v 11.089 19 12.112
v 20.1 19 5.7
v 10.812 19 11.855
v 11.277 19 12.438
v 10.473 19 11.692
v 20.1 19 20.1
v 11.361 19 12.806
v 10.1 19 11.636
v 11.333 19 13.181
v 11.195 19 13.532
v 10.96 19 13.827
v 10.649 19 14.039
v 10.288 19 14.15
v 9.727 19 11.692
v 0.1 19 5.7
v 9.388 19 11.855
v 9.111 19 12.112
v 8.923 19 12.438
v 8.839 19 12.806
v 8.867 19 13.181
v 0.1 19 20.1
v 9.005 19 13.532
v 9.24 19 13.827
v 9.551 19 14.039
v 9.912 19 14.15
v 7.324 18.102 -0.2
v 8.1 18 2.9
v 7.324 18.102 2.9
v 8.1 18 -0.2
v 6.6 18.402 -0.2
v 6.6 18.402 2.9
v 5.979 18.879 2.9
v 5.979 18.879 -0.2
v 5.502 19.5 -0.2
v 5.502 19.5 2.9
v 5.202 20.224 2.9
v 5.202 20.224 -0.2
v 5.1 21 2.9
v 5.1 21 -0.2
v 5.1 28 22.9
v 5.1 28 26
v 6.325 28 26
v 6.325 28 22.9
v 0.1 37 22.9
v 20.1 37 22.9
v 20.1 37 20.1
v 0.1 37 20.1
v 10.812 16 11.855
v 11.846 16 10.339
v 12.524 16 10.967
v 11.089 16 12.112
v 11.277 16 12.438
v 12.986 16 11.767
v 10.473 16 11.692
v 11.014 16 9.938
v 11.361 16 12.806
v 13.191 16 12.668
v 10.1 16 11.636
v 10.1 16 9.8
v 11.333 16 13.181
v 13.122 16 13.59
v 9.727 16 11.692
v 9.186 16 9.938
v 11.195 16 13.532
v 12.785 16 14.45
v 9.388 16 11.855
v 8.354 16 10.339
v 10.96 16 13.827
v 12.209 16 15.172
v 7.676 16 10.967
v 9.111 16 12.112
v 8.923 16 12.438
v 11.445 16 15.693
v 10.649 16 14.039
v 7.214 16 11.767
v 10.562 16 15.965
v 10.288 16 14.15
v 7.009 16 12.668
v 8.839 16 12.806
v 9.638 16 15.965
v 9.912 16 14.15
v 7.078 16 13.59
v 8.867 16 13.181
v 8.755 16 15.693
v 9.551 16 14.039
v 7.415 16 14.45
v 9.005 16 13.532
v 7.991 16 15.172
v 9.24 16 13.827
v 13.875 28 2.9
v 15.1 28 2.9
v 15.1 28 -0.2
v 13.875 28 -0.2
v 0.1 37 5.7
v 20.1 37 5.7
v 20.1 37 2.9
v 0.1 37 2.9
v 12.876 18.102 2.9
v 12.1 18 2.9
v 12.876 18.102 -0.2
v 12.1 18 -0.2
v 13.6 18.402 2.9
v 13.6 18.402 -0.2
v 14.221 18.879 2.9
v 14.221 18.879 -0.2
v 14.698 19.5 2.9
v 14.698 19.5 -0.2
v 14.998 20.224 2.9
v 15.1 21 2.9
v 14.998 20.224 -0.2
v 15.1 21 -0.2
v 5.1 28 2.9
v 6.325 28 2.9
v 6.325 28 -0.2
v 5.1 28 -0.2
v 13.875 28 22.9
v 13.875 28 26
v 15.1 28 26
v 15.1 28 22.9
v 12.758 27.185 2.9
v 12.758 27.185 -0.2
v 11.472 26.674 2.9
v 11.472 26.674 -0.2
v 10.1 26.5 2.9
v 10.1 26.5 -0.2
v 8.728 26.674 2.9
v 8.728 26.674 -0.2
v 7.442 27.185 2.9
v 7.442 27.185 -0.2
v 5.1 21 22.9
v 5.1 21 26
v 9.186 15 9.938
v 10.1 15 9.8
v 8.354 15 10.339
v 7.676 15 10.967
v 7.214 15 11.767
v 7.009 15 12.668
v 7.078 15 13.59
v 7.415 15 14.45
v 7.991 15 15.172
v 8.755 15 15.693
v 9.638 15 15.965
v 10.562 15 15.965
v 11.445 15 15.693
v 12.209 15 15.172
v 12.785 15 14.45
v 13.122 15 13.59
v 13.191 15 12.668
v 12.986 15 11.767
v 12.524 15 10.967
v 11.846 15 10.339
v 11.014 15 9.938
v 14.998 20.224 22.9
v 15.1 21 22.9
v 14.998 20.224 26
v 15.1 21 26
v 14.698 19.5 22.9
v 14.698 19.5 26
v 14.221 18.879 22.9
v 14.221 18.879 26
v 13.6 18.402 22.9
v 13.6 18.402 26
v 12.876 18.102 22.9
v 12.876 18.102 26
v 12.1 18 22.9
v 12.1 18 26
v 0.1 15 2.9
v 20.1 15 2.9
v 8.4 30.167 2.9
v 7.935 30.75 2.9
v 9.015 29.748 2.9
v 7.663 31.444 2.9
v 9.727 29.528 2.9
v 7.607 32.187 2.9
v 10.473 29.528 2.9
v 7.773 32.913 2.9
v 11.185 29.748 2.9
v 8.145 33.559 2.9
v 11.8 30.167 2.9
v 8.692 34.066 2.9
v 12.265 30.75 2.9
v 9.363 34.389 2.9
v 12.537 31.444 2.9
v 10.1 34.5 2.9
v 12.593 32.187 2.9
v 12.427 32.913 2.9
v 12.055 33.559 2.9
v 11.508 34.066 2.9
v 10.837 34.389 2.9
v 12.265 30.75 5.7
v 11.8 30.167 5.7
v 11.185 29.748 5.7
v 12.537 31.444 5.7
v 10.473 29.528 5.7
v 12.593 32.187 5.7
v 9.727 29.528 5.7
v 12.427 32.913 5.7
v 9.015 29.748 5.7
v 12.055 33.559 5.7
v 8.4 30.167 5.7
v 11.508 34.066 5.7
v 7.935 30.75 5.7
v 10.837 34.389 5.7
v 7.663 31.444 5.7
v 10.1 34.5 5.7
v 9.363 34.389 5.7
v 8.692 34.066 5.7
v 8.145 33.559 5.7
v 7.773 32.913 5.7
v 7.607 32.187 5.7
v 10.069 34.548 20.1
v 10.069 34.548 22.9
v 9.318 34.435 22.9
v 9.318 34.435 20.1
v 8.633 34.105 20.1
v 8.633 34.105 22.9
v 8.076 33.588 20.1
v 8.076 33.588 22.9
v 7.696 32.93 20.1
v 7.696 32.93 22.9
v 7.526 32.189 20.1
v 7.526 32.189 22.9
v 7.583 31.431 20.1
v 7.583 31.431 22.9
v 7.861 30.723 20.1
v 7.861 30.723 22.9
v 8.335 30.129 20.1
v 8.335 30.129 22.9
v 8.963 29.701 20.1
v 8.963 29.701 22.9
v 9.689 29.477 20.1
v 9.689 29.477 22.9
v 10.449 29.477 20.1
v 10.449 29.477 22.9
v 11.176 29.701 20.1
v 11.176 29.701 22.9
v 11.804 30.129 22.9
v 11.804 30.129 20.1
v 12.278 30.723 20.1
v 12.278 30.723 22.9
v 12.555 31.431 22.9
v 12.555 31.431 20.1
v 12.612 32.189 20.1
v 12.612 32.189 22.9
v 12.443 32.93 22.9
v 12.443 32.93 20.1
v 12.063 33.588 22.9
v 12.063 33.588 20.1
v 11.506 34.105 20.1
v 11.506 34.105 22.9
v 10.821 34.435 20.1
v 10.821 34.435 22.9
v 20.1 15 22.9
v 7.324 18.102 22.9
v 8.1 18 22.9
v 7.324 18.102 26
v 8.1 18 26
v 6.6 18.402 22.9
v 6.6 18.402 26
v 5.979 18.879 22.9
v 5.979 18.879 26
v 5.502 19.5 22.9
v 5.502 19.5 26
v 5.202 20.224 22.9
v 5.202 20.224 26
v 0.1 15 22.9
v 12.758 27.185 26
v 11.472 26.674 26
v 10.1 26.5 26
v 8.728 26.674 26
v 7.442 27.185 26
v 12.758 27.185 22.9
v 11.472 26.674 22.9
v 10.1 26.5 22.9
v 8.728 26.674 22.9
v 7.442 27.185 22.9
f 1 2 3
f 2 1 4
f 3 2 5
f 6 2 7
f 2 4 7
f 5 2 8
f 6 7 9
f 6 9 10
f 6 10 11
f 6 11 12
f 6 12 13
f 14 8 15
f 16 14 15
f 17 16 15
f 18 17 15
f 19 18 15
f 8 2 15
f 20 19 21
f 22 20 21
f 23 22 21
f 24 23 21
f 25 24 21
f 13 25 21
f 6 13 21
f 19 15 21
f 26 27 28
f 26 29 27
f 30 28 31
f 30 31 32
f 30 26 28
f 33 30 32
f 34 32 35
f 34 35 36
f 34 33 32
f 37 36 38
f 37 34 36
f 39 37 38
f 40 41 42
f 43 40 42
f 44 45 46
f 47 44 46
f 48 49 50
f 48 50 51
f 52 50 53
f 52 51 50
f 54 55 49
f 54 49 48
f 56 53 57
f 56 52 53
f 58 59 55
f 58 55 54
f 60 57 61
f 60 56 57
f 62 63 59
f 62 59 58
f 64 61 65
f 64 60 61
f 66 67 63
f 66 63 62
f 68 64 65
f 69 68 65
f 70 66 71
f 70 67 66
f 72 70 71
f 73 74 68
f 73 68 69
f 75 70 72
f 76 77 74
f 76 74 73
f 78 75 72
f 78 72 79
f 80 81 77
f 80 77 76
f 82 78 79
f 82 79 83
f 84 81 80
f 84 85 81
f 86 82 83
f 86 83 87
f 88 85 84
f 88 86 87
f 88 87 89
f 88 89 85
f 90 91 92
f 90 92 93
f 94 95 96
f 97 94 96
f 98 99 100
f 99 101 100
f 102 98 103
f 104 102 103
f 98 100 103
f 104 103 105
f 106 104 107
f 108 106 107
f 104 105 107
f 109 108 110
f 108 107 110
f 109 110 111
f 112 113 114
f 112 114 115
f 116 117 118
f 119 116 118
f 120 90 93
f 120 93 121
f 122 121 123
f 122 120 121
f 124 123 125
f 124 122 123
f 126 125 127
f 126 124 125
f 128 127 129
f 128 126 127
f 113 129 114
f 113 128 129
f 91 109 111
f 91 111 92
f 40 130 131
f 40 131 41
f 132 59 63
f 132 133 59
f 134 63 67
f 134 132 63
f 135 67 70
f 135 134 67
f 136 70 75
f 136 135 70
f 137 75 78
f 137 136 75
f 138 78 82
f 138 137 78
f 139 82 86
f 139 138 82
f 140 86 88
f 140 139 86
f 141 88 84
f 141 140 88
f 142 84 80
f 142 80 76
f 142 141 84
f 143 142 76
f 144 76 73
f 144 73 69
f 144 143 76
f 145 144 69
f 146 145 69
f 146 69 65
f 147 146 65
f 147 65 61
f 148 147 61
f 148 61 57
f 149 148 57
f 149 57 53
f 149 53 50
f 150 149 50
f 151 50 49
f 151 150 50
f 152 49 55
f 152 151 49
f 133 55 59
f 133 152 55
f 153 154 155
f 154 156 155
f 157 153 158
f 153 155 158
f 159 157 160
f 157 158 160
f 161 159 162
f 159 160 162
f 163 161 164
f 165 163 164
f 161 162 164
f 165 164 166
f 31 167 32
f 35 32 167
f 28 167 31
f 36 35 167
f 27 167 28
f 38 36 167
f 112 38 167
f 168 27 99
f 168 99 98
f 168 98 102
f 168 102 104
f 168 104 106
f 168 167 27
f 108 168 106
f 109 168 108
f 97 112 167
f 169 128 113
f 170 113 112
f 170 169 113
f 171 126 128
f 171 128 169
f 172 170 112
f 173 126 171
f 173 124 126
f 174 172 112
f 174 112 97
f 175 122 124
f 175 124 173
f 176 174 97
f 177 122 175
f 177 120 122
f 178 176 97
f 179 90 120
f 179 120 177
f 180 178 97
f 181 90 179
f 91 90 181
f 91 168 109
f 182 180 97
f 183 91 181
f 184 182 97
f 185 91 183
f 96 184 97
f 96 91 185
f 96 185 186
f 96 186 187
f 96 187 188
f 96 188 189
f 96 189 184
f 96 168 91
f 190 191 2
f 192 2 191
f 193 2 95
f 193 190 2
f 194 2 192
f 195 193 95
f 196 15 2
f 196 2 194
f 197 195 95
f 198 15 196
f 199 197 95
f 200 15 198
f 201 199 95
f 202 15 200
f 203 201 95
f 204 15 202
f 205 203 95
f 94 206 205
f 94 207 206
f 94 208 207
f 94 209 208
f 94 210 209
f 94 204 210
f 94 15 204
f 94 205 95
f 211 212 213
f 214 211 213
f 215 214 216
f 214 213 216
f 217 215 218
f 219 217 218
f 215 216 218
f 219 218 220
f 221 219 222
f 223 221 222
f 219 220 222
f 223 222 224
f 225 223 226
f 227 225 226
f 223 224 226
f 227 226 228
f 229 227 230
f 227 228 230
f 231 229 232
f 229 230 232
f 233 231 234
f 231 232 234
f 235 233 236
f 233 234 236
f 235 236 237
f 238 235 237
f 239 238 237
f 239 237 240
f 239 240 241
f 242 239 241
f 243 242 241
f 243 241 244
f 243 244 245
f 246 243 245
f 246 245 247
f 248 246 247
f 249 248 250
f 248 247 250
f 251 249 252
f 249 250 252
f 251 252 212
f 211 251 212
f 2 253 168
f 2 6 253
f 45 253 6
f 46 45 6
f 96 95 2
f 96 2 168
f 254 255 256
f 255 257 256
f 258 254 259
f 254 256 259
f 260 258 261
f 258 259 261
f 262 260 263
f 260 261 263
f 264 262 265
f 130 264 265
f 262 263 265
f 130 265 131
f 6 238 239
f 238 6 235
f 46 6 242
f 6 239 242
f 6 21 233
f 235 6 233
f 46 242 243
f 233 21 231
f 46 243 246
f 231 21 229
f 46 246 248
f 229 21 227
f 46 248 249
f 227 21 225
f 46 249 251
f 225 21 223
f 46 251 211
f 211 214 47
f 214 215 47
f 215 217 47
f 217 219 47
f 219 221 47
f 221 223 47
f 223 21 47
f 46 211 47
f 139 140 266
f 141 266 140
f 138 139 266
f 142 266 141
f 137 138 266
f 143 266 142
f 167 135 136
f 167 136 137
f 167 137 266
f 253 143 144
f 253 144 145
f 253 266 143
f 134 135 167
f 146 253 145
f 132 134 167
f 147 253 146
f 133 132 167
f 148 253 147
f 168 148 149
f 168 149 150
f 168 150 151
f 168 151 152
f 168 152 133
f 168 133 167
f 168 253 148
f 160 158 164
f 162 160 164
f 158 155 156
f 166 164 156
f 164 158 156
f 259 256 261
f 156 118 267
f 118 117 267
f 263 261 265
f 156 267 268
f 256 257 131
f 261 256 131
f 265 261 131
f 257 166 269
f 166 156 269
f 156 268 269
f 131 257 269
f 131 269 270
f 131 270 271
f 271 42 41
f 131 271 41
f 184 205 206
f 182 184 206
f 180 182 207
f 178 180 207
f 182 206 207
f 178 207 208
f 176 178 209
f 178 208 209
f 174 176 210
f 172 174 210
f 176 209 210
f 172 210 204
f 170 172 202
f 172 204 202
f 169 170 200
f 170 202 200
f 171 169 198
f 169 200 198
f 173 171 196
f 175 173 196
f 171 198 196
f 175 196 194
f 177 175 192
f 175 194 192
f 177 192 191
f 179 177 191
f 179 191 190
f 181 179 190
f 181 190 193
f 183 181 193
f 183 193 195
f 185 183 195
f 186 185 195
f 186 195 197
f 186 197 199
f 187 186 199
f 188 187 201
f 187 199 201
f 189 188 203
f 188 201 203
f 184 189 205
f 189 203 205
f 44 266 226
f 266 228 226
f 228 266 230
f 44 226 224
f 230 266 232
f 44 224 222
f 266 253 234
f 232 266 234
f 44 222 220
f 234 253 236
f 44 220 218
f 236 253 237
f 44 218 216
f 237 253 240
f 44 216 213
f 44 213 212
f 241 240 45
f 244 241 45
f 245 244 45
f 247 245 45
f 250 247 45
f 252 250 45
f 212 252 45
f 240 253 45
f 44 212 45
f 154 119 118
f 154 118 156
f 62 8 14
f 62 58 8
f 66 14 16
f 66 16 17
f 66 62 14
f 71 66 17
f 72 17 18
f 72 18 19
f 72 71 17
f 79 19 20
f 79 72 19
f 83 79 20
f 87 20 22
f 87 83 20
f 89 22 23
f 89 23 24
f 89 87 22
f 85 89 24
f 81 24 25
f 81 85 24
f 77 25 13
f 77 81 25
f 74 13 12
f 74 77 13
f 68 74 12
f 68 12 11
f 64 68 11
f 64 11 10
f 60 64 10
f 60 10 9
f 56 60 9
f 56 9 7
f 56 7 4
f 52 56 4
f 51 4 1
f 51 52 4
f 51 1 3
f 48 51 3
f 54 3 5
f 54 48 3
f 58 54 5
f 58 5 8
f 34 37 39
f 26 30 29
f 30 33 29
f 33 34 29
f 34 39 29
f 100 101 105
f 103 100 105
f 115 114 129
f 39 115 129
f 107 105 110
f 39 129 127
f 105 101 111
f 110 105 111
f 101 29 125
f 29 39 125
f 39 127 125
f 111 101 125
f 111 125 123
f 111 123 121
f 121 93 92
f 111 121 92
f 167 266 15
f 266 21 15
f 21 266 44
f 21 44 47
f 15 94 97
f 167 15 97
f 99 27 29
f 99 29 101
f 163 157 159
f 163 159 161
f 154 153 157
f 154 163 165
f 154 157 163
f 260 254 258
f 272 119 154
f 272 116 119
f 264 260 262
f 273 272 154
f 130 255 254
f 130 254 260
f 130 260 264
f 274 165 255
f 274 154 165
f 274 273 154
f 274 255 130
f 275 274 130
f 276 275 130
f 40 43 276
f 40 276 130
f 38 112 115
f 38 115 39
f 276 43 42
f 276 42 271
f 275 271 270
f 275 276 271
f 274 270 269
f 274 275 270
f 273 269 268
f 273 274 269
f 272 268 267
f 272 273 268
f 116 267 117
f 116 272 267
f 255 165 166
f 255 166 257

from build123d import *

# Parameters (mm, degrees)
SKETCH114_W          = 20
SKETCH114_H          = 22
BOSS_EXTRUDE16_DEPTH = 20
SKETCH115_W          = 14.4
SKETCH115_H          = 18
CUT_EXTRUDE6_DEPTH   = 48.889560449
BOSS_EXTRUDE17_DEPTH = 3.1
BOSS_EXTRUDE18_DEPTH = 3.1
SKETCH123_W          = 2.5
SKETCH123_H          = 2.801
FILLET6_R            = 3
FILLET7_R            = 3
SKETCH128_W          = 2.55
SKETCH128_H          = 5.9


with BuildPart() as part:
    # Sketch114 → Boss-Extrude16 (new body)
    with BuildSketch(Plane(origin=(20.1, 0, 0), x_dir=(0, 0, -1), z_dir=(1, 0, 0))):
        with Locations((-12.9, 26)):
            Rectangle(SKETCH114_W, SKETCH114_H)
    extrude(amount=-BOSS_EXTRUDE16_DEPTH)

    # Sketch115 → Cut-Extrude6 (cut, through all)
    with BuildSketch(Plane.ZY.offset(-0.1)):
        with Locations((12.9, 28)):
            Rectangle(SKETCH115_W, SKETCH115_H)
    extrude(amount=-CUT_EXTRUDE6_DEPTH, mode=Mode.SUBTRACT)

    # Sketch122 → Boss-Extrude18 (add)
    with BuildSketch(Plane(origin=(0, 0, 2.9), x_dir=(-1, 0, 0), z_dir=(0, 0, -1))):
        with BuildLine():
            Line((-15.1, 18), (-15.1, 28))
            Line((-15.1, 28), (-13.874917218, 28))
            ThreePointArc((-13.874917218, 28), (-10.1, 26.5), (-6.325082782, 28))
            Line((-6.325082782, 28), (-5.1, 28))
            Line((-5.1, 28), (-5.1, 18))
            Line((-5.1, 18), (-15.1, 18))
        make_face()
    extrude(amount=BOSS_EXTRUDE18_DEPTH)

    # Sketch123 → Ø5.0 (5) Diameter Hole1 (revolve, cut)
    with BuildSketch(Plane(origin=(10.1, 32, 2.9), x_dir=(0, 1, 0), z_dir=(1, 0, 0))):
        with Locations((1.25, 1.4005)):
            Rectangle(SKETCH123_W, SKETCH123_H)
    revolve(axis=Axis((10.1, 32, -3.45), (0, 0, 1)), mode=Mode.SUBTRACT)

    # Sketch125 → CBORE for M2 Hex Head Machine Screw6 (revolve, cut)
    with BuildSketch(Plane(origin=(10.1, 15, 12.9), x_dir=(0, 0, -1), z_dir=(1, 0, 0))):
        Polygon((0, 0), (0, 4), (1.2645, 4), (1.2645, 1), (3.1, 1), (3.1, 0), align=None)
    revolve(axis=Axis((10.1, 8.65, 12.9), (0, 1, 0)), mode=Mode.SUBTRACT)

    # Fillet7
    fillet7_edges = [part.edges().sort_by_distance(p)[0] for p in [
        (15.1, 18, 1.35),
        (5.1, 18, 1.35),
    ]]
    fillet(fillet7_edges, radius=FILLET7_R)

    # Sketch128 → Ø5.1 (5.1) Diameter Hole1 (revolve, cut)
    with BuildSketch(Plane(origin=(10.069319505, 31.99803671, 20.1), x_dir=(0, 1, 0), z_dir=(1, 0, 0))):
        with Locations((1.275, 2.95)):
            Rectangle(SKETCH128_W, SKETCH128_H)
    revolve(axis=Axis((10.069319505, 31.99803671, 13.75), (0, 0, 1)), mode=Mode.SUBTRACT)


with BuildPart() as body_2:
    # Sketch121 → Boss-Extrude17 (new body)
    with BuildSketch(Plane.XY.offset(22.9)):
        with BuildLine():
            Line((5.1, 28), (6.325082782, 28))
            ThreePointArc((6.325082782, 28), (10.1, 26.5), (13.874917218, 28))
            Line((13.874917218, 28), (15.1, 28))
            Line((15.1, 28), (15.1, 18))
            Line((15.1, 18), (5.1, 18))
            Line((5.1, 18), (5.1, 28))
        make_face()
    extrude(amount=BOSS_EXTRUDE17_DEPTH)

    # Fillet6
    fillet6_edges = [body_2.edges().sort_by_distance(p)[0] for p in [
        (15.1, 18, 24.45),
        (5.1, 18, 24.45),
    ]]
    fillet(fillet6_edges, radius=FILLET6_R)


solid = Compound([part.part, body_2.part])
